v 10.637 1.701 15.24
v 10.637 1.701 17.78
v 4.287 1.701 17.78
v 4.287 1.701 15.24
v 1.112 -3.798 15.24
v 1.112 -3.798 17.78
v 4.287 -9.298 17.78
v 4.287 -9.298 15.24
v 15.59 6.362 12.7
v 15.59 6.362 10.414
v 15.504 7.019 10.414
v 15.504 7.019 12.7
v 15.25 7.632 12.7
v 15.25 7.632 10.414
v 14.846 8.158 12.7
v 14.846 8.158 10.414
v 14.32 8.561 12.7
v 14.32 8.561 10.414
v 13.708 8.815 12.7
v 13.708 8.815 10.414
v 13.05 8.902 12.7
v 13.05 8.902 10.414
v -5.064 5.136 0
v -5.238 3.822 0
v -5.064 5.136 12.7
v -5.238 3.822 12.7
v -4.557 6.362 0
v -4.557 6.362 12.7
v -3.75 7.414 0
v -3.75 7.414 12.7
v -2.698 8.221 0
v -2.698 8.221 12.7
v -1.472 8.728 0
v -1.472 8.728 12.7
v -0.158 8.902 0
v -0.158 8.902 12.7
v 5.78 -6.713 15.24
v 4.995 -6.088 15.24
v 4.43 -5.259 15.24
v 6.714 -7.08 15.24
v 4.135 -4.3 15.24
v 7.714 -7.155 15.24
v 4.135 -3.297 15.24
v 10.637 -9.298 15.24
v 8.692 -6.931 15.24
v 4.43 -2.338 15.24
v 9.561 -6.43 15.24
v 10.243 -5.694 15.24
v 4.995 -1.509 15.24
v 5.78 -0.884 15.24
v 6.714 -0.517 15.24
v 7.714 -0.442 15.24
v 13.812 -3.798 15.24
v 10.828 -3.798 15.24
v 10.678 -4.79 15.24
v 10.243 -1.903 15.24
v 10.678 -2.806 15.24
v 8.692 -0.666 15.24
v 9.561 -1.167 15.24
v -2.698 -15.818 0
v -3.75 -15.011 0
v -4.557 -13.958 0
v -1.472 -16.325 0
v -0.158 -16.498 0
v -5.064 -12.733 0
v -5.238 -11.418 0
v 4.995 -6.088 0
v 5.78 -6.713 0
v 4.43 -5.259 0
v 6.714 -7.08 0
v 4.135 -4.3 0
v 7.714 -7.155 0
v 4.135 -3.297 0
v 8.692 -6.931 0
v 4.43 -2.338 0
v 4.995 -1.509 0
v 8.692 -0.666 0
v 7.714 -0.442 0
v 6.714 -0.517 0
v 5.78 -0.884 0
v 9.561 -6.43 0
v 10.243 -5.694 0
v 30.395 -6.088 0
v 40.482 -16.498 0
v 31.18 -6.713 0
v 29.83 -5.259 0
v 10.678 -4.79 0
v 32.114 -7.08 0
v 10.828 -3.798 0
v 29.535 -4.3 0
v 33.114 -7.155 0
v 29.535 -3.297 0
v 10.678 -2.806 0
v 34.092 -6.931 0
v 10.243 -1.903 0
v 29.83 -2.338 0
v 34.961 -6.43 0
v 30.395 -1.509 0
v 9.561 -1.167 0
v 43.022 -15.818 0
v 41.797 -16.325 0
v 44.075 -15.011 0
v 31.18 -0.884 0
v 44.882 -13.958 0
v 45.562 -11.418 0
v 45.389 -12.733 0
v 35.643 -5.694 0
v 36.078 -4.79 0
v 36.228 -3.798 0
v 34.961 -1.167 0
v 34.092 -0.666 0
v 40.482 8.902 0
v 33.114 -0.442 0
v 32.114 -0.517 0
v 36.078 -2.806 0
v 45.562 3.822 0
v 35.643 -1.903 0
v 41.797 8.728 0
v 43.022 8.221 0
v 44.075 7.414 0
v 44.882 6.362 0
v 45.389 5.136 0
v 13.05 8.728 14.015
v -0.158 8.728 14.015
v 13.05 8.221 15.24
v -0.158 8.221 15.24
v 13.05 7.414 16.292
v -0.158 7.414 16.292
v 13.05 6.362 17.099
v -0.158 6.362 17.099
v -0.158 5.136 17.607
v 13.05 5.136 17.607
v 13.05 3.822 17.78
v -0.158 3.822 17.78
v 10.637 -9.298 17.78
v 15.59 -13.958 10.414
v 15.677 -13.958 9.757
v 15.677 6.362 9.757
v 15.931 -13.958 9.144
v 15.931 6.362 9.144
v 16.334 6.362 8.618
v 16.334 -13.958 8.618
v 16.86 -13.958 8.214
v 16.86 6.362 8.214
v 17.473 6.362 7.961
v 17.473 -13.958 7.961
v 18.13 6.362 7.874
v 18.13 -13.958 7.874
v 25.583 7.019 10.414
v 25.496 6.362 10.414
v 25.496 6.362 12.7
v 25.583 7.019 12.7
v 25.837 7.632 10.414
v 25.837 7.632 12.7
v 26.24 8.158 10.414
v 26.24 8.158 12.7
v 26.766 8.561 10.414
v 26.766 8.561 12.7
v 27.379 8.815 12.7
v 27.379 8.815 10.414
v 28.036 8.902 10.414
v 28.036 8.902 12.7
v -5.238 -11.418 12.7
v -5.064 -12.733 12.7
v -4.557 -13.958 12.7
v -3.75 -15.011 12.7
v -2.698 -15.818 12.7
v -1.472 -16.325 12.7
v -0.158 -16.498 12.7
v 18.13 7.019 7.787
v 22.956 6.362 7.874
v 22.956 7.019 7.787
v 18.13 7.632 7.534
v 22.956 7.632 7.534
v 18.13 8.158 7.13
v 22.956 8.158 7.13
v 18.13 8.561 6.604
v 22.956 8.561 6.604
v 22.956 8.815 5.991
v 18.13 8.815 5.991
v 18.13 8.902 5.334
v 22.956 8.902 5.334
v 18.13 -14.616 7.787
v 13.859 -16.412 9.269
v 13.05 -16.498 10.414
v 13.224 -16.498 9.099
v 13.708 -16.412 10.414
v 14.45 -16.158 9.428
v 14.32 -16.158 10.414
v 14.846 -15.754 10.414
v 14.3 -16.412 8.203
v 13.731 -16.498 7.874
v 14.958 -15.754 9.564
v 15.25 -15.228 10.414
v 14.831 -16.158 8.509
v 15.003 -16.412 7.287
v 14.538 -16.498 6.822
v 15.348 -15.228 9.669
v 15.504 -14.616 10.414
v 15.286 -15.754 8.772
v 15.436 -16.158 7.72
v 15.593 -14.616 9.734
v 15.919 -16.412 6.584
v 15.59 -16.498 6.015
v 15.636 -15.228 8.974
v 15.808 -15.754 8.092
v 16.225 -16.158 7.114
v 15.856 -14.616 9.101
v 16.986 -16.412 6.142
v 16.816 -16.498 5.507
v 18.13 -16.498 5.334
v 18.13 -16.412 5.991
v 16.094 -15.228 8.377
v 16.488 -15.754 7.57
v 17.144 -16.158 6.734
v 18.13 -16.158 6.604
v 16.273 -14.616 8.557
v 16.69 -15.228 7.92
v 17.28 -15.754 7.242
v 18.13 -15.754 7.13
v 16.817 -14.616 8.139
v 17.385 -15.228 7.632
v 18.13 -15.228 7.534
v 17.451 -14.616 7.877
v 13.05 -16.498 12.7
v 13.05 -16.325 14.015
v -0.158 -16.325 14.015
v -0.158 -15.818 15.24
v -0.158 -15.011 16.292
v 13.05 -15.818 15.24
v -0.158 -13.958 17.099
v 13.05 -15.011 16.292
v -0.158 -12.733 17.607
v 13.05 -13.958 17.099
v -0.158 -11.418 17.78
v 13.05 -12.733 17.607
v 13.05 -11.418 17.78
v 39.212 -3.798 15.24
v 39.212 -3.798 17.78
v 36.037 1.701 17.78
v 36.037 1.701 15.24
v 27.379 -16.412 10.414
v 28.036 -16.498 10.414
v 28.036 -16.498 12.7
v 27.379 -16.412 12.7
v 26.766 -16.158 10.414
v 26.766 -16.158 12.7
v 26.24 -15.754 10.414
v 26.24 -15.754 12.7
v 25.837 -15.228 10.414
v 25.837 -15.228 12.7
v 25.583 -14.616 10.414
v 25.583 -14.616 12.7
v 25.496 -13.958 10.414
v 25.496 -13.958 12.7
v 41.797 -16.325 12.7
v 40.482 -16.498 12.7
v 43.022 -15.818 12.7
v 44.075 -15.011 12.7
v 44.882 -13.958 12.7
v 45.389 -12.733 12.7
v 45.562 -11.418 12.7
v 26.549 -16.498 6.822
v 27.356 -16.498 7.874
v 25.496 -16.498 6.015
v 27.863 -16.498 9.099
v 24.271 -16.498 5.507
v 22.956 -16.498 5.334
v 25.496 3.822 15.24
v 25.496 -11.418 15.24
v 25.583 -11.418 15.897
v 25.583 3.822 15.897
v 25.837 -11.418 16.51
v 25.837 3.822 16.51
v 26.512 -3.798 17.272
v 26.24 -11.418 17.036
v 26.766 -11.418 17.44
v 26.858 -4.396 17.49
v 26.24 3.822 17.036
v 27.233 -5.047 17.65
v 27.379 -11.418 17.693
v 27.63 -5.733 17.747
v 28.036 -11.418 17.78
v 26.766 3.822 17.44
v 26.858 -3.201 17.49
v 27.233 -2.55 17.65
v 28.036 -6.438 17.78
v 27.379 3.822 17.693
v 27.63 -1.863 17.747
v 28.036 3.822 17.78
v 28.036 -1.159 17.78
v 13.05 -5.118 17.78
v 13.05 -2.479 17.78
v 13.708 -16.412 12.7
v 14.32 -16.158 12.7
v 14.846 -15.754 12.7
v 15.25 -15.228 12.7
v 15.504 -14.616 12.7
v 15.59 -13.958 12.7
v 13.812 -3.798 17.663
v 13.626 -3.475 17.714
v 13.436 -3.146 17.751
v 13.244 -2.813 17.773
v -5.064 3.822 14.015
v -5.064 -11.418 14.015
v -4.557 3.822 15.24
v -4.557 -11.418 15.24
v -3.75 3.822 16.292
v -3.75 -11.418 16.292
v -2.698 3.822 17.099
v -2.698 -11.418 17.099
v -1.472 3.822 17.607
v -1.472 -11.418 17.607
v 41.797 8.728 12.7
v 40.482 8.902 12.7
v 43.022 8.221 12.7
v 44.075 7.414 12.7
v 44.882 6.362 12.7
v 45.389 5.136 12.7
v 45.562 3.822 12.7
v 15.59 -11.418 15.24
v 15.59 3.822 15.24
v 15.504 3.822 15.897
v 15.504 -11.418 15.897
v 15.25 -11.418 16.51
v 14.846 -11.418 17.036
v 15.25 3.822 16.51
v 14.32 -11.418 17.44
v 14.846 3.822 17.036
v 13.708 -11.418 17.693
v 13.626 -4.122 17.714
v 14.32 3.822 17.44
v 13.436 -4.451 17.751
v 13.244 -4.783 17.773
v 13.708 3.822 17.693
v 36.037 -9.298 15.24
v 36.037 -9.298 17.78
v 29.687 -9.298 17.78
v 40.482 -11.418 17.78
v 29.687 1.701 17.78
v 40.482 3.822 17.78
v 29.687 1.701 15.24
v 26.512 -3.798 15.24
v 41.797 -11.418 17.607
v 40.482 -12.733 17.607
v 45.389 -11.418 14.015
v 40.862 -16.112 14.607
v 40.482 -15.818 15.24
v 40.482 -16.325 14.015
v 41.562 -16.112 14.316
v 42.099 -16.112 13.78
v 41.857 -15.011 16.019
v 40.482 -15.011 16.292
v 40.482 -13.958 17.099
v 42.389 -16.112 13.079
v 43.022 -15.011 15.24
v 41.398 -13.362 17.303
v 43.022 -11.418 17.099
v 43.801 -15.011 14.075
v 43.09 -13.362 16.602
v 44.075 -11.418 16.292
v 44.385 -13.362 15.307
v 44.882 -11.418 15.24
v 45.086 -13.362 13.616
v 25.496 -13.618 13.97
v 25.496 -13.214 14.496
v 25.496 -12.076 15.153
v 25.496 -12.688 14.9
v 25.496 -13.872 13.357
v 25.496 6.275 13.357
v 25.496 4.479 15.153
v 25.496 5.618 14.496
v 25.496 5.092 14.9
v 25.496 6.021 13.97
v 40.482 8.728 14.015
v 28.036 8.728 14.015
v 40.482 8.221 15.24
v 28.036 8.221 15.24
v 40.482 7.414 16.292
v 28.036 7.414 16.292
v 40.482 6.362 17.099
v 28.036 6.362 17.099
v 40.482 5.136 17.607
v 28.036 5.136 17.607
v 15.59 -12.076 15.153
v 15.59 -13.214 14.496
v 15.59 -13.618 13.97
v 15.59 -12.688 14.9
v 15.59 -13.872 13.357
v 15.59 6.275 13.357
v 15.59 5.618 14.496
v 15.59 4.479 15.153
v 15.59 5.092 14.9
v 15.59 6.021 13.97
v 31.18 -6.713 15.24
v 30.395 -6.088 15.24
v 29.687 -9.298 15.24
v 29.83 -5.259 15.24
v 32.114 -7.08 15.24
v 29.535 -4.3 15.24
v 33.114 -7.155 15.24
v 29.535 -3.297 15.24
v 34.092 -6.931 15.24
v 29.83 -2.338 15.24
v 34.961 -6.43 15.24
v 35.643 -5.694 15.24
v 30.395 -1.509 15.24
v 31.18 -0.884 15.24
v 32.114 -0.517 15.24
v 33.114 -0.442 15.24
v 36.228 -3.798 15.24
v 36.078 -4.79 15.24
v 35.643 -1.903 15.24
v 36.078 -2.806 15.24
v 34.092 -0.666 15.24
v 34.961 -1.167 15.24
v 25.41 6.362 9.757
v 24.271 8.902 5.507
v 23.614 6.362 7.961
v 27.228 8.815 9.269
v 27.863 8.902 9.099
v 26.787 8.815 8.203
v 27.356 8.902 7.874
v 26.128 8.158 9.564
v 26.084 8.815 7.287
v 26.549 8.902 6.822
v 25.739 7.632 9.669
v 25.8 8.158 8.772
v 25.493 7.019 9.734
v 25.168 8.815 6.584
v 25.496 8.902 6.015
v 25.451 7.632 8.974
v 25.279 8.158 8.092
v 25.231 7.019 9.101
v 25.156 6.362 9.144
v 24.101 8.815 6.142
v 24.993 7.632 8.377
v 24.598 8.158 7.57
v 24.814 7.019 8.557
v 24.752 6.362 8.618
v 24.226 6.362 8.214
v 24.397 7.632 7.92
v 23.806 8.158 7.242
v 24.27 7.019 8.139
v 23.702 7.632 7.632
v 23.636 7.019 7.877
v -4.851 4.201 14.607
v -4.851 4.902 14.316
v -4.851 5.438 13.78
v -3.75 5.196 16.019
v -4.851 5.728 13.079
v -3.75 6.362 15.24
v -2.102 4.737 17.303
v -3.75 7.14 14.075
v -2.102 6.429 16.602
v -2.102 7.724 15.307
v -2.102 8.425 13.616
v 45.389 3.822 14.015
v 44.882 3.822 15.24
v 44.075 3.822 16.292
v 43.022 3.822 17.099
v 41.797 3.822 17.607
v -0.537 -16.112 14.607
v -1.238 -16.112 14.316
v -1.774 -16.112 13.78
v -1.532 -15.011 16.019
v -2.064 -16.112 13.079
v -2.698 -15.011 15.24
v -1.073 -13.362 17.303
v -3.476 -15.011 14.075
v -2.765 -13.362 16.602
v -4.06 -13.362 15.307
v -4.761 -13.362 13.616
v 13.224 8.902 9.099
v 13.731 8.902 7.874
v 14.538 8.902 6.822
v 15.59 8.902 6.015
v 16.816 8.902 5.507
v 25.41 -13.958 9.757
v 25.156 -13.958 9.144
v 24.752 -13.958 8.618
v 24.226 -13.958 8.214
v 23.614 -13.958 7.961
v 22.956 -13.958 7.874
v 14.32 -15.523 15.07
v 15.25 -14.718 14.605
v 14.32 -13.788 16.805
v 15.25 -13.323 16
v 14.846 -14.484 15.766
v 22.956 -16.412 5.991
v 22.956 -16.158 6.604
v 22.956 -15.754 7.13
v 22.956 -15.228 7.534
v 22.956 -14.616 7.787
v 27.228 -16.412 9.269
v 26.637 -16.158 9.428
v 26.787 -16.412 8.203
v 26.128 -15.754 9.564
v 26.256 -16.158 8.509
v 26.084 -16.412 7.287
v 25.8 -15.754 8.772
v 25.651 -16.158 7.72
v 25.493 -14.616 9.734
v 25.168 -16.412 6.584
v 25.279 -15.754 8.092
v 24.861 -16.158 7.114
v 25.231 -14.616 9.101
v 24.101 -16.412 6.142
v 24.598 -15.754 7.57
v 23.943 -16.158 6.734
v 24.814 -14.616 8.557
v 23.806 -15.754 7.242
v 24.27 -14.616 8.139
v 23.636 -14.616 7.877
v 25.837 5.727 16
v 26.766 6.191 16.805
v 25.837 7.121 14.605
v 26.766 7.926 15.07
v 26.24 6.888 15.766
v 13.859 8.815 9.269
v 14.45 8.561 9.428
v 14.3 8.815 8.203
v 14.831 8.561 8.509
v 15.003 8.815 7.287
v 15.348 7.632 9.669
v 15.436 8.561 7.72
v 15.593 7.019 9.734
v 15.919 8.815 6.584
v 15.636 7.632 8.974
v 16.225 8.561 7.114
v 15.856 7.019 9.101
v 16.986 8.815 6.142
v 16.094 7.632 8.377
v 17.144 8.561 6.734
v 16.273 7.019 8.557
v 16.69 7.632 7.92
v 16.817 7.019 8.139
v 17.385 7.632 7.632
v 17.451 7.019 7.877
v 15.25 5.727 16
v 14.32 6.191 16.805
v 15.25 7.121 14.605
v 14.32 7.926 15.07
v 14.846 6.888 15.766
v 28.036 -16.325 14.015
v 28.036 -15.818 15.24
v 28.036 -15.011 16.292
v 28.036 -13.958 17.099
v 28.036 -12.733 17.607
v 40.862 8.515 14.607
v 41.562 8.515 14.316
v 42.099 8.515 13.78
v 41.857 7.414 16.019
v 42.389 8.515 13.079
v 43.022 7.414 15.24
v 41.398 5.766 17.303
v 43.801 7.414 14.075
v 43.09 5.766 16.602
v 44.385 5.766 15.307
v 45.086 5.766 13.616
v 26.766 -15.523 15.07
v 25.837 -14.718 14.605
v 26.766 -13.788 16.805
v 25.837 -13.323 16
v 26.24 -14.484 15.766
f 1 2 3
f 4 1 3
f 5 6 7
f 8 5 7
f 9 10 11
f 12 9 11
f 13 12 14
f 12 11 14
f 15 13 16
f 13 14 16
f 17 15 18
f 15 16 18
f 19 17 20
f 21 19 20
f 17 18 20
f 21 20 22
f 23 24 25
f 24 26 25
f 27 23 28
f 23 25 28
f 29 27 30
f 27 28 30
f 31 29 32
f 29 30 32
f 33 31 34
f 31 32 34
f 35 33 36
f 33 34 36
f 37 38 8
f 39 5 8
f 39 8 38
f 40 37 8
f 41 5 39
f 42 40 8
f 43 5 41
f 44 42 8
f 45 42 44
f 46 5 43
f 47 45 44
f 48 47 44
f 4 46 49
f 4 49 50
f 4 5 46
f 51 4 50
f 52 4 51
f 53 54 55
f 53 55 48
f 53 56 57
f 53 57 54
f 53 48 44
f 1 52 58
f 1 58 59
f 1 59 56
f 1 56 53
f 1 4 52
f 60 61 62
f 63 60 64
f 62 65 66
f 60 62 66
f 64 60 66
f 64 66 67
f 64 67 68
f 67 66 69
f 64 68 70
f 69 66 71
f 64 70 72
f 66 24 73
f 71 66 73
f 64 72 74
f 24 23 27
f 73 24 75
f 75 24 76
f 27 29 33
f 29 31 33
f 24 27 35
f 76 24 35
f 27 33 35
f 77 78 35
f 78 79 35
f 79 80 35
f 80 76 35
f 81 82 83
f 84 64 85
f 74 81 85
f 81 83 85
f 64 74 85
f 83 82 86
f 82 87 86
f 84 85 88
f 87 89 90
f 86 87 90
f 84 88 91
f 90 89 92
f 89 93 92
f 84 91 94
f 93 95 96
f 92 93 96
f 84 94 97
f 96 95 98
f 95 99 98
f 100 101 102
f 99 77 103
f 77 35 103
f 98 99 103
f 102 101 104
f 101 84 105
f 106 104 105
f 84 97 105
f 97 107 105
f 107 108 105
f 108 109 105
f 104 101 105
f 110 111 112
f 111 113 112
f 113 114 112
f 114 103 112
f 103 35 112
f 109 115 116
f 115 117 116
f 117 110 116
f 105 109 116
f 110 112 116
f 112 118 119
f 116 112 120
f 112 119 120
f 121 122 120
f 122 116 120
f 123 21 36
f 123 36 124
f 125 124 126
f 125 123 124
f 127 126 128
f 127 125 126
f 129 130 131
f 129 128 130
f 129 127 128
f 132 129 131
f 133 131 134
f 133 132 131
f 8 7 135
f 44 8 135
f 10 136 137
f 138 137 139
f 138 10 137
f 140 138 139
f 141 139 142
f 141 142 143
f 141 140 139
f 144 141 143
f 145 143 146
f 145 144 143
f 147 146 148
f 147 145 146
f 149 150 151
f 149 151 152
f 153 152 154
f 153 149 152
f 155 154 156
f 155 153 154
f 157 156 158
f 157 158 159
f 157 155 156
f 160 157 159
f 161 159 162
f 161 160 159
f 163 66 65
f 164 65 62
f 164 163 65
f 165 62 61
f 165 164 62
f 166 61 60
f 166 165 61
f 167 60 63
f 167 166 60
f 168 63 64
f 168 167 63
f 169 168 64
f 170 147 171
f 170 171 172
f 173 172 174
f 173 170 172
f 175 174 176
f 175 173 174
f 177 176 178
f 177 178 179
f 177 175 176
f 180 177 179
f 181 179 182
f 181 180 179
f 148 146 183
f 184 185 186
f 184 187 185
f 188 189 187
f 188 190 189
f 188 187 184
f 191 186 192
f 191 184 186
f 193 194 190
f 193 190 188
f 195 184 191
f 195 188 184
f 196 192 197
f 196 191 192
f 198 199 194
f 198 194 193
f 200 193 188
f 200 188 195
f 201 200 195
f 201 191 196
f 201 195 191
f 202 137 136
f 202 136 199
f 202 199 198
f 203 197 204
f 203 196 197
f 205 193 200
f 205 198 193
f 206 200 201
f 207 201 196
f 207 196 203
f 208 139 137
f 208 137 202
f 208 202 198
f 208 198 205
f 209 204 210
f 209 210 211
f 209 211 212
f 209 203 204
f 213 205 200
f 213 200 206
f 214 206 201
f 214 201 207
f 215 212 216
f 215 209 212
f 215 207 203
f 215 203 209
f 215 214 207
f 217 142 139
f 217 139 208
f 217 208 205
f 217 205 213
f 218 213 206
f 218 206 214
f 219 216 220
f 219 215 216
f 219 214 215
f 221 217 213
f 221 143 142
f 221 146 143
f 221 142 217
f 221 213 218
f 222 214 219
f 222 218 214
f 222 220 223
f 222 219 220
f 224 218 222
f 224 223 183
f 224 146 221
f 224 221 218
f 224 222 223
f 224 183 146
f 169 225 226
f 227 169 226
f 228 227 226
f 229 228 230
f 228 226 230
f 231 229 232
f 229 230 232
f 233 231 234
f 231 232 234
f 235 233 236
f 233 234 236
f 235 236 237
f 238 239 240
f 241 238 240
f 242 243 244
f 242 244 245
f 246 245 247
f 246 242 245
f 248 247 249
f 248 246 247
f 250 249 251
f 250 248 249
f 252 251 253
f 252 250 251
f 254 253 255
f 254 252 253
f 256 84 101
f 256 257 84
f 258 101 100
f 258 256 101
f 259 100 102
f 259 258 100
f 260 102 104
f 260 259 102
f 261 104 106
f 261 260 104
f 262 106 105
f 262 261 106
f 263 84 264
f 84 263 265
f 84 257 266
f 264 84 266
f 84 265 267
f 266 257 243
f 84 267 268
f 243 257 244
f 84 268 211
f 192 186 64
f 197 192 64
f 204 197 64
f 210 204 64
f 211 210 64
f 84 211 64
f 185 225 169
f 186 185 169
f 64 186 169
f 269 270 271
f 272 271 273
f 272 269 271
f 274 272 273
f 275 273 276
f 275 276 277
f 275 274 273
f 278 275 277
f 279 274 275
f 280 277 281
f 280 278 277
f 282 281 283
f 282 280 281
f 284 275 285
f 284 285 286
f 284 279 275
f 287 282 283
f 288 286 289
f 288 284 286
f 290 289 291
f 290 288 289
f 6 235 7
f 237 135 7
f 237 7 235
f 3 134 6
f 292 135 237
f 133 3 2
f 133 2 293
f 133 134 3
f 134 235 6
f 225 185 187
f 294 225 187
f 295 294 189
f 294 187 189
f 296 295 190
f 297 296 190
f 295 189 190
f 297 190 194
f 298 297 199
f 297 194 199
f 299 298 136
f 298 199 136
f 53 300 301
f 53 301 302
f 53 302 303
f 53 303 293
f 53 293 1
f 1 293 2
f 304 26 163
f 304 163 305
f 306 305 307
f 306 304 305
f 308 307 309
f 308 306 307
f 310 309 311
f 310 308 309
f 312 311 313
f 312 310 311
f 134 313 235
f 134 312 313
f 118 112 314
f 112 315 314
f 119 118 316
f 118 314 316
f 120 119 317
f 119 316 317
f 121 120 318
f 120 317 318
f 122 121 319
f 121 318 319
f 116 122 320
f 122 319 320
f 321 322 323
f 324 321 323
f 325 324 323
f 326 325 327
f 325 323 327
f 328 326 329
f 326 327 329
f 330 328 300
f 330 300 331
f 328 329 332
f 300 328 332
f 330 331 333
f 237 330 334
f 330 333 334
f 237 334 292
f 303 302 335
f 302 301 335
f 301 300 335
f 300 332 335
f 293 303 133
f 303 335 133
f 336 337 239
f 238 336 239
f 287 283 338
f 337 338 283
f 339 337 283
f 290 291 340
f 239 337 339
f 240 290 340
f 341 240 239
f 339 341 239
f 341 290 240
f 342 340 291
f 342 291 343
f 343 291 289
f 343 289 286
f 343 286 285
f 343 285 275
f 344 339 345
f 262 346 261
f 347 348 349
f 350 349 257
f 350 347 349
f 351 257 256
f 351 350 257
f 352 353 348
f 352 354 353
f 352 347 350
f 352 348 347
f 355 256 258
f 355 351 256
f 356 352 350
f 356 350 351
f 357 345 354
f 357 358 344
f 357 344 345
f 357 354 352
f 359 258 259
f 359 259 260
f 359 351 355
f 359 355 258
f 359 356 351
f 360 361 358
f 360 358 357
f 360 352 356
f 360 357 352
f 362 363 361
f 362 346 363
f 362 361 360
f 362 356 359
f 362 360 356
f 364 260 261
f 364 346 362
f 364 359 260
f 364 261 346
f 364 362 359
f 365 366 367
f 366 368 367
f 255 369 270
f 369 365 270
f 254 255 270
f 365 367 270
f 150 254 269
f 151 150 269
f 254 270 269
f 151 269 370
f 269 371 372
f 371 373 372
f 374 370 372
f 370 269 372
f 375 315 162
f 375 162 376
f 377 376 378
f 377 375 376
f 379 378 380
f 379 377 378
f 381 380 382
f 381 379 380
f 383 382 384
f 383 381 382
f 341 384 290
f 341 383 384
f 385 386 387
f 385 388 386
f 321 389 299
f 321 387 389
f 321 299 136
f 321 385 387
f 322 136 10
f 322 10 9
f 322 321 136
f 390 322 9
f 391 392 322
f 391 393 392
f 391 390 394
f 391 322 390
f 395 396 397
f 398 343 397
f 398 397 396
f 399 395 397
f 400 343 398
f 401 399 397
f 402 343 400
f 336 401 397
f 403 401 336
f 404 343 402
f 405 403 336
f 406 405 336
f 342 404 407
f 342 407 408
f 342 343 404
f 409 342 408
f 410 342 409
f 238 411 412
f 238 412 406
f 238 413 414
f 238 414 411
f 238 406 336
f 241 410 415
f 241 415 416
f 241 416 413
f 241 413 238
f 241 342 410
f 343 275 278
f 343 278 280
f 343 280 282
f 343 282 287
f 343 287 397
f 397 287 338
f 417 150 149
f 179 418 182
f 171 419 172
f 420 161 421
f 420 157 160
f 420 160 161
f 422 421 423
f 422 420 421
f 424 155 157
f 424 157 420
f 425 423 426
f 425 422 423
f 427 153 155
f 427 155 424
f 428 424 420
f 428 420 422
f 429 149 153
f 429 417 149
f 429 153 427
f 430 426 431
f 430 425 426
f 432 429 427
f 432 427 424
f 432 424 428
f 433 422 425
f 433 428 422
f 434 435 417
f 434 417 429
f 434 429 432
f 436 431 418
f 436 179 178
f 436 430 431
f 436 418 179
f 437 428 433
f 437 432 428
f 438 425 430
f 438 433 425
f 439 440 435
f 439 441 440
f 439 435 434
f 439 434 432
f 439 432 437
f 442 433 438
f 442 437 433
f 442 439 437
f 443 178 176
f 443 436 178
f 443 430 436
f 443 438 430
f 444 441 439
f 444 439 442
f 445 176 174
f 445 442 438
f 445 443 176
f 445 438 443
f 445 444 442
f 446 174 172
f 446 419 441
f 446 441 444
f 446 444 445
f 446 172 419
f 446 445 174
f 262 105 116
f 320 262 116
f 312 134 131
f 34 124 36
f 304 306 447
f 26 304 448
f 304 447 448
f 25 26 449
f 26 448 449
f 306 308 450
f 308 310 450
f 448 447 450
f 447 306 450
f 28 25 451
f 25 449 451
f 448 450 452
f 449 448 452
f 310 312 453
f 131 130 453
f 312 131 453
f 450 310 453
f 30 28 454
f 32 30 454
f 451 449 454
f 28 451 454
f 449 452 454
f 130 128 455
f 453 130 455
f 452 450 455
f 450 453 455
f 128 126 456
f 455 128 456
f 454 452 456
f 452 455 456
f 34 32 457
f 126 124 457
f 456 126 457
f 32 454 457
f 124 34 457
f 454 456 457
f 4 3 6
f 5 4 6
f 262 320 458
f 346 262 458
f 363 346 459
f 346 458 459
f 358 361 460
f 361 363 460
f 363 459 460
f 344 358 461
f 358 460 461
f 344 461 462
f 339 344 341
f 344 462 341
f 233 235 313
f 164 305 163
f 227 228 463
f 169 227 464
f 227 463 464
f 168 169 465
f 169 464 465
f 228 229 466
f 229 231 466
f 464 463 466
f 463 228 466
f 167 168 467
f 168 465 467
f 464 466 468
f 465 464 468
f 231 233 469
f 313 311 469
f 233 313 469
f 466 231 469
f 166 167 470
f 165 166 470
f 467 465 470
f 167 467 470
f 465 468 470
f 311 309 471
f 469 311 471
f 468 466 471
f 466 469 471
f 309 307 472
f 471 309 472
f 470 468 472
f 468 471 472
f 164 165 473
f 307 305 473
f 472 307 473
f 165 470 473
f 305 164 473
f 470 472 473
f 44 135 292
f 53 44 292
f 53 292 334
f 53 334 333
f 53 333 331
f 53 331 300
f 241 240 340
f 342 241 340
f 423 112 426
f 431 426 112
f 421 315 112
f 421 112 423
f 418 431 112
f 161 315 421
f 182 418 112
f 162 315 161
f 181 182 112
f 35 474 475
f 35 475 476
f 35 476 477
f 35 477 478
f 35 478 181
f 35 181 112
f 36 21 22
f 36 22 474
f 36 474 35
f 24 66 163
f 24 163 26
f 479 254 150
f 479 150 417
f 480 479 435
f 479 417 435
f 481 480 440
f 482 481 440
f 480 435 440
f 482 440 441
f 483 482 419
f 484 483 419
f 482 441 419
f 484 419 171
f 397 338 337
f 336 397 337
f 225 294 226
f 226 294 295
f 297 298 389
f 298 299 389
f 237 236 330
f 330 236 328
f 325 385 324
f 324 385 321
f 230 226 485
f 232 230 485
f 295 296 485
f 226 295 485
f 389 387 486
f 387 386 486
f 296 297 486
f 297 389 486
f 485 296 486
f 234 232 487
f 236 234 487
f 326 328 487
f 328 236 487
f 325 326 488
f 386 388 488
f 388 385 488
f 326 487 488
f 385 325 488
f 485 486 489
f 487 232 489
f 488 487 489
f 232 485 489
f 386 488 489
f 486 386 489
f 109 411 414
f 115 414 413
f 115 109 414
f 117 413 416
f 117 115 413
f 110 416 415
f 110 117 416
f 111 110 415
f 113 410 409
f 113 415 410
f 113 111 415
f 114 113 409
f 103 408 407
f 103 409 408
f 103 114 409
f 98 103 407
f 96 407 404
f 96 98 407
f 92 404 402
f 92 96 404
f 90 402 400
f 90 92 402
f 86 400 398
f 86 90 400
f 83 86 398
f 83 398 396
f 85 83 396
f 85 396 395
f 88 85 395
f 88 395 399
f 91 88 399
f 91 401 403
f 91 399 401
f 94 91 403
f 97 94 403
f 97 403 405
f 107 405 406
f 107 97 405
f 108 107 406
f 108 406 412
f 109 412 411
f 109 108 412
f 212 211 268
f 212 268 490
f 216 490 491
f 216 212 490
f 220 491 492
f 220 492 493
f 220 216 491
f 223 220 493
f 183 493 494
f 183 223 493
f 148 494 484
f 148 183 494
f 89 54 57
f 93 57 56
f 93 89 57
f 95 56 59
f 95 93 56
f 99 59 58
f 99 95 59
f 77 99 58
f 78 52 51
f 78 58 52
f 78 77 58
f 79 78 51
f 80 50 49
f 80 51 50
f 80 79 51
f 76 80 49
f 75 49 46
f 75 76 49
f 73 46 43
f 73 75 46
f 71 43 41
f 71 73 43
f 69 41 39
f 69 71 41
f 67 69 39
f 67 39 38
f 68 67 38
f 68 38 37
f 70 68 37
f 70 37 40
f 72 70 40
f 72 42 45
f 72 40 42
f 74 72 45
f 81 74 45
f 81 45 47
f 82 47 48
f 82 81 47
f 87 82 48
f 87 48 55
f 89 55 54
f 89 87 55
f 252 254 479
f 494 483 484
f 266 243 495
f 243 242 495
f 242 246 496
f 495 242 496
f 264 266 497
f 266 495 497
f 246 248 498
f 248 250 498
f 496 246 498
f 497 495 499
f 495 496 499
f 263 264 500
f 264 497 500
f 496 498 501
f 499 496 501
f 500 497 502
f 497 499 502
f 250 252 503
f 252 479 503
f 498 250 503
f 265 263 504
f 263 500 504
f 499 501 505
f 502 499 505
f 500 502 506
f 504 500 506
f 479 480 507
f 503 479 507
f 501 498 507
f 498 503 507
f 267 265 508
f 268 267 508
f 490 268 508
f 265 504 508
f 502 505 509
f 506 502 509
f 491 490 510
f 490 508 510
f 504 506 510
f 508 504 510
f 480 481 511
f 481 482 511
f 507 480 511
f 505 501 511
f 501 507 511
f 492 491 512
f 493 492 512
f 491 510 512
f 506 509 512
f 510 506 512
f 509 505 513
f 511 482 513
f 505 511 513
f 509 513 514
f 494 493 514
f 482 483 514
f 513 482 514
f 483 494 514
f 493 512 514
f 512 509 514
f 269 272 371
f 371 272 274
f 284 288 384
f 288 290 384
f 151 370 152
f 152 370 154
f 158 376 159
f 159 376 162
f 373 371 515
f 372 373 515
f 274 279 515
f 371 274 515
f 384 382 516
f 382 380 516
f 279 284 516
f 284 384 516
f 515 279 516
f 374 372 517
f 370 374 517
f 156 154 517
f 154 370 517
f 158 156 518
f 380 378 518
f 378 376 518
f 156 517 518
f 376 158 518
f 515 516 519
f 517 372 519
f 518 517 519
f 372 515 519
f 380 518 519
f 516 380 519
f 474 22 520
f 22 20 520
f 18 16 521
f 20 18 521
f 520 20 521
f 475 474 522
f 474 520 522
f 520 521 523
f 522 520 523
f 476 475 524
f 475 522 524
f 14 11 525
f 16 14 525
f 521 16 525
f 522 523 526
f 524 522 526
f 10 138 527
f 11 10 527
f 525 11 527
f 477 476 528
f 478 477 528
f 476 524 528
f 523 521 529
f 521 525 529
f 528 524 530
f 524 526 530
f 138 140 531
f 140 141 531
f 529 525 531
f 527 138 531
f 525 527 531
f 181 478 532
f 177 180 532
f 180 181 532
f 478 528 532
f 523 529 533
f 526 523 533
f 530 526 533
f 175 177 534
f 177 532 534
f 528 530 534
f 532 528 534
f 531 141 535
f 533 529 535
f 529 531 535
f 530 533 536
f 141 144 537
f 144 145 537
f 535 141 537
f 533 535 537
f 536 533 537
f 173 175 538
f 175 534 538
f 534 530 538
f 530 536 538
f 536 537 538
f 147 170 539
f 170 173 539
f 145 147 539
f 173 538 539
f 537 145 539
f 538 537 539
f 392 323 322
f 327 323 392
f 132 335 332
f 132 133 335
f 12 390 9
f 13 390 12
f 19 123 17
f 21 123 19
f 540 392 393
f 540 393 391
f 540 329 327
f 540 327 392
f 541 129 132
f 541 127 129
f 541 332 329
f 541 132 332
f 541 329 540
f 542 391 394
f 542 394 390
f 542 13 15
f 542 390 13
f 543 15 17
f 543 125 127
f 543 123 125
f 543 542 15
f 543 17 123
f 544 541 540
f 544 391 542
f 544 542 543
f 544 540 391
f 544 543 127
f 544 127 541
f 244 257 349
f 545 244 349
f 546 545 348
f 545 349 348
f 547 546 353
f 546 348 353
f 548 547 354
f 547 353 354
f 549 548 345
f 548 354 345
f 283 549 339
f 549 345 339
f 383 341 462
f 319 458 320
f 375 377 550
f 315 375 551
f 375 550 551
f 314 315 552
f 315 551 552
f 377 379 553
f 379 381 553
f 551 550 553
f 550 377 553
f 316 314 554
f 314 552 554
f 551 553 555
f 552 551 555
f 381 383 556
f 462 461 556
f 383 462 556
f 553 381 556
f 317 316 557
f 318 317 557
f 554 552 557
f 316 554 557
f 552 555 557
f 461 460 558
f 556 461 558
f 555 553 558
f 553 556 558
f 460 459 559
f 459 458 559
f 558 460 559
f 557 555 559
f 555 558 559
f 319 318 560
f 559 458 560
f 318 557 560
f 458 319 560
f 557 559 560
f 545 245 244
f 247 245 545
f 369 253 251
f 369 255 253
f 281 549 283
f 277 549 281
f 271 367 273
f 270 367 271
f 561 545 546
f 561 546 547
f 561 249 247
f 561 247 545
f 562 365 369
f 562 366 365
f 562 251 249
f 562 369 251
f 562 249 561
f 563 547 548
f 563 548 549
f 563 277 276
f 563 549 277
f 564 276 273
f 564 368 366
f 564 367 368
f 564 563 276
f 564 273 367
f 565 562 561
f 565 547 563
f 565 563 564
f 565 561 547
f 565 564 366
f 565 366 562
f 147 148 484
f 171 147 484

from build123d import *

# Parameters (mm, degrees)
F0_W         = 50.8
F0_H         = 25.4
F0_R         = 3.3655
F1_DEPTH     = 17.78
F2_W         = 9.906
F2_H         = 25.4
F3_DEPTH     = 9.906
F5_DEPTH     = 2.54
F6_R         = 5.08
F7_T1_DEPTH  = 25.4
F7_T3_DEPTH  = 4.826
F7_T5_DEPTH  = 15.24
F7_T7_DEPTH  = 2.286
F7_T10_ANGLE = 90
F7_T12_ANGLE = 90
F7_T14_ANGLE = 90
F7_T16_ANGLE = 90
F7_T18_ANGLE = 90
F7_T20_ANGLE = 90
F7_T22_ANGLE = 90
F7_T24_ANGLE = 90


# Not quite as in the source:
# - a fillet or chamfer that OpenCascade refuses, or shapes differently, is made with other operations: its cross-section is extruded or revolved along the edge and cut away or added
# - a feature names something its author has since deleted; it is built from what else it names


with BuildPart() as f1:
    # F0 (on Top) → F1 (new body)
    with BuildSketch(Plane.XY):
        with Locations((20.1624472324, -3.7984256737)):
            Rectangle(F0_W, F0_H)
        with Locations((7.4624472324, -3.7984256737)):
            Circle(F0_R, mode=Mode.SUBTRACT)
        with Locations((32.8624472324, -3.7984256737)):
            Circle(F0_R, mode=Mode.SUBTRACT)
    extrude(amount=F1_DEPTH)

    # F2 (on face) → F3 (cut)
    with BuildSketch(Plane.XY.offset(17.78)):
        with Locations((20.5434472324, -3.7984256737)):
            Rectangle(F2_W, F2_H)
    extrude(amount=-F3_DEPTH, mode=Mode.SUBTRACT)

    # F4 (on face) → F5 (cut)
    with BuildSketch(Plane.XY.offset(17.78)):
        Polygon((29.6874472324, -9.2976869878), (36.0374472324, -9.2976869878), (39.2124472324, -3.7984256737), (36.0374472324, 1.7008356403), (29.6874472324, 1.7008356403), (26.5124472324, -3.7984256737), align=None)
        Polygon((4.2874472324, -9.2976869878), (10.6374472324, -9.2976869878), (13.8124472324, -3.7984256737), (10.6374472324, 1.7008356403), (4.2874472324, 1.7008356403), (1.1124472324, -3.7984256737), align=None)
    extrude(amount=-F5_DEPTH, mode=Mode.SUBTRACT)

    # F6
    f6_edges = [f1.edges().sort_by_distance(p)[0] for p in [
        (45.562447, -3.798426, 17.78),
        (5.176447, 8.901574, 17.78),
        (-5.237553, -3.798426, 17.78),
        (5.176447, -16.498426, 17.78),
        (35.529447, -16.498426, 17.78),
        (35.529447, 8.901574, 17.78),
        (-5.237553, 8.901574, 8.89),
        (-5.237553, -16.498426, 8.89),
        (45.562447, -16.498426, 8.89),
        (45.562447, 8.901574, 8.89),
    ]]
    fillet(f6_edges, radius=F6_R)

    # F7: fillet of radius 2.54 on 10 edges, made by hand

    # F7_s2 → F7_t1 (join)
    with BuildSketch(Plane.XZ.offset(-8.9015743263)):
        with BuildLine():
            ThreePointArc((15.5904472324, 10.414), (16.3343960082, 8.6179487758), (18.1304472324, 7.874))
            Line((18.1304472324, 7.874), (15.5904472324, 7.874))
            Line((15.5904472324, 7.874), (15.5904472324, 10.414))
        make_face()
        with BuildLine():
            ThreePointArc((25.4964472324, 10.414), (24.7524984566, 8.6179487758), (22.9564472324, 7.874))
            Line((22.9564472324, 7.874), (25.4964472324, 7.874))
            Line((25.4964472324, 7.874), (25.4964472324, 10.414))
        make_face()
    extrude(amount=F7_T1_DEPTH)

    # F7_s4 → F7_t3 (cut)
    with BuildSketch(Plane.YZ.offset(18.1304472324)):
        with BuildLine():
            ThreePointArc((6.3615743263, 7.874), (8.1576255505, 7.1300512242), (8.9015743263, 5.334))
            Line((8.9015743263, 5.334), (8.9015743263, 7.874))
            Line((8.9015743263, 7.874), (6.3615743263, 7.874))
        make_face()
        with BuildLine():
            ThreePointArc((-16.4984256737, 5.334), (-15.7544768979, 7.1300512242), (-13.9584256737, 7.874))
            Line((-13.9584256737, 7.874), (-16.4984256737, 7.874))
            Line((-16.4984256737, 7.874), (-16.4984256737, 5.334))
        make_face()
    extrude(amount=F7_T3_DEPTH, mode=Mode.SUBTRACT)

    # F7_s6 → F7_t5 (cut)
    with BuildSketch(Plane.XZ.offset(-3.8215743263)):
        with BuildLine():
            ThreePointArc((15.5904472324, 15.24), (14.8464984566, 17.0360512242), (13.0504472324, 17.78))
            Line((13.0504472324, 17.78), (15.5904472324, 17.78))
            Line((15.5904472324, 17.78), (15.5904472324, 15.24))
        make_face()
        with BuildLine():
            ThreePointArc((25.4964472324, 15.24), (26.2403960082, 17.0360512242), (28.0364472324, 17.78))
            Line((28.0364472324, 17.78), (25.4964472324, 17.78))
            Line((25.4964472324, 17.78), (25.4964472324, 15.24))
        make_face()
    extrude(amount=F7_T5_DEPTH, mode=Mode.SUBTRACT)

    # F7_s8 → F7_t7 (cut)
    with BuildSketch(Plane.XY.offset(10.414)):
        with BuildLine():
            ThreePointArc((25.4964472324, 6.3615743263), (26.2403960082, 8.1576255505), (28.0364472324, 8.9015743263))
            Line((28.0364472324, 8.9015743263), (25.4964472324, 8.9015743263))
            Line((25.4964472324, 8.9015743263), (25.4964472324, 6.3615743263))
        make_face()
        with BuildLine():
            ThreePointArc((15.5904472324, 6.3615743263), (14.8464984566, 8.1576255505), (13.0504472324, 8.9015743263))
            Line((13.0504472324, 8.9015743263), (15.5904472324, 8.9015743263))
            Line((15.5904472324, 8.9015743263), (15.5904472324, 6.3615743263))
        make_face()
        with BuildLine():
            ThreePointArc((28.0364472324, -16.4984256737), (26.2403960082, -15.7544768979), (25.4964472324, -13.9584256737))
            Line((25.4964472324, -13.9584256737), (25.4964472324, -16.4984256737))
            Line((25.4964472324, -16.4984256737), (28.0364472324, -16.4984256737))
        make_face()
        with BuildLine():
            ThreePointArc((13.0504472324, -16.4984256737), (14.8464984566, -15.7544768979), (15.5904472324, -13.9584256737))
            Line((15.5904472324, -13.9584256737), (15.5904472324, -16.4984256737))
            Line((15.5904472324, -16.4984256737), (13.0504472324, -16.4984256737))
        make_face()
    extrude(amount=F7_T7_DEPTH, mode=Mode.SUBTRACT)

    # F7_s9 → F7_t10 (revolve, cut)
    with BuildSketch(Plane.XY.offset(12.7)):
        with BuildLine():
            ThreePointArc((13.0504472324, -16.4984256737), (14.8464984566, -15.7544768979), (15.5904472324, -13.9584256737))
            Line((15.5904472324, -13.9584256737), (15.5904472324, -16.4984256737))
            Line((15.5904472324, -16.4984256737), (13.0504472324, -16.4984256737))
        make_face()
    revolve(axis=Axis((15.5904472324, -11.4184256737, 12.7), (-1, 0, 0)), revolution_arc=F7_T10_ANGLE, mode=Mode.SUBTRACT)

    # F7_s11 → F7_t12 (revolve, cut)
    with BuildSketch(Plane.XY.offset(12.7)):
        with BuildLine():
            ThreePointArc((28.0364472324, -16.4984256737), (26.2403960082, -15.7544768979), (25.4964472324, -13.9584256737))
            Line((25.4964472324, -13.9584256737), (25.4964472324, -16.4984256737))
            Line((25.4964472324, -16.4984256737), (28.0364472324, -16.4984256737))
        make_face()
    revolve(axis=Axis((25.4964472324, -11.4184256737, 12.7), (-1, 0, 0)), revolution_arc=F7_T12_ANGLE, mode=Mode.SUBTRACT)

    # F7_s13 → F7_t14 (revolve, cut)
    with BuildSketch(Plane.XZ.offset(-3.8215743263)):
        with BuildLine():
            ThreePointArc((15.5904472324, 15.24), (14.8464984566, 17.0360512242), (13.0504472324, 17.78))
            Line((13.0504472324, 17.78), (15.5904472324, 17.78))
            Line((15.5904472324, 17.78), (15.5904472324, 15.24))
        make_face()
    revolve(axis=Axis((15.5904472324, 3.8215743263, 12.7), (-1, 0, 0)), revolution_arc=F7_T14_ANGLE, mode=Mode.SUBTRACT)

    # F7_s15 → F7_t16 (revolve, cut)
    with BuildSketch(Plane.XZ.offset(-3.8215743263)):
        with BuildLine():
            ThreePointArc((25.4964472324, 15.24), (26.2403960082, 17.0360512242), (28.0364472324, 17.78))
            Line((28.0364472324, 17.78), (25.4964472324, 17.78))
            Line((25.4964472324, 17.78), (25.4964472324, 15.24))
        make_face()
    revolve(axis=Axis((25.4964472324, 3.8215743263, 12.7), (-1, 0, 0)), revolution_arc=F7_T16_ANGLE, mode=Mode.SUBTRACT)

    # F7_s17 → F7_t18 (revolve, cut)
    with BuildSketch(Plane.XY.offset(10.414)):
        with BuildLine():
            ThreePointArc((13.0504472324, -16.4984256737), (14.8464984566, -15.7544768979), (15.5904472324, -13.9584256737))
            Line((15.5904472324, -13.9584256737), (15.5904472324, -16.4984256737))
            Line((15.5904472324, -16.4984256737), (13.0504472324, -16.4984256737))
        make_face()
    revolve(axis=Axis((18.1304472324, -16.4984256737, 10.414), (0, -1, 0)), revolution_arc=F7_T18_ANGLE, mode=Mode.SUBTRACT)

    # F7_s19 → F7_t20 (revolve, cut)
    with BuildSketch(Plane.XY.offset(10.414)):
        with BuildLine():
            ThreePointArc((28.0364472324, -16.4984256737), (26.2403960082, -15.7544768979), (25.4964472324, -13.9584256737))
            Line((25.4964472324, -13.9584256737), (25.4964472324, -16.4984256737))
            Line((25.4964472324, -16.4984256737), (28.0364472324, -16.4984256737))
        make_face()
    revolve(axis=Axis((22.9564472324, -16.4984256737, 10.414), (0, 1, 0)), revolution_arc=F7_T20_ANGLE, mode=Mode.SUBTRACT)

    # F7_s21 → F7_t22 (revolve, cut)
    with BuildSketch(Plane.XY.offset(10.414)):
        with BuildLine():
            ThreePointArc((13.0504472324, 8.9015743263), (14.8464984566, 8.1576255505), (15.5904472324, 6.3615743263))
            Line((15.5904472324, 6.3615743263), (15.5904472324, 8.9015743263))
            Line((15.5904472324, 8.9015743263), (13.0504472324, 8.9015743263))
        make_face()
    revolve(axis=Axis((18.1304472324, 8.9015743263, 10.414), (0, -1, 0)), revolution_arc=F7_T22_ANGLE, mode=Mode.SUBTRACT)

    # F7_s23 → F7_t24 (revolve, cut)
    with BuildSketch(Plane.XY.offset(10.414)):
        with BuildLine():
            ThreePointArc((28.0364472324, 8.9015743263), (26.2403960082, 8.1576255505), (25.4964472324, 6.3615743263))
            Line((25.4964472324, 6.3615743263), (25.4964472324, 8.9015743263))
            Line((25.4964472324, 8.9015743263), (28.0364472324, 8.9015743263))
        make_face()
    revolve(axis=Axis((22.9564472324, 8.9015743263, 10.414), (0, 1, 0)), revolution_arc=F7_T24_ANGLE, mode=Mode.SUBTRACT)


solid = f1.part
